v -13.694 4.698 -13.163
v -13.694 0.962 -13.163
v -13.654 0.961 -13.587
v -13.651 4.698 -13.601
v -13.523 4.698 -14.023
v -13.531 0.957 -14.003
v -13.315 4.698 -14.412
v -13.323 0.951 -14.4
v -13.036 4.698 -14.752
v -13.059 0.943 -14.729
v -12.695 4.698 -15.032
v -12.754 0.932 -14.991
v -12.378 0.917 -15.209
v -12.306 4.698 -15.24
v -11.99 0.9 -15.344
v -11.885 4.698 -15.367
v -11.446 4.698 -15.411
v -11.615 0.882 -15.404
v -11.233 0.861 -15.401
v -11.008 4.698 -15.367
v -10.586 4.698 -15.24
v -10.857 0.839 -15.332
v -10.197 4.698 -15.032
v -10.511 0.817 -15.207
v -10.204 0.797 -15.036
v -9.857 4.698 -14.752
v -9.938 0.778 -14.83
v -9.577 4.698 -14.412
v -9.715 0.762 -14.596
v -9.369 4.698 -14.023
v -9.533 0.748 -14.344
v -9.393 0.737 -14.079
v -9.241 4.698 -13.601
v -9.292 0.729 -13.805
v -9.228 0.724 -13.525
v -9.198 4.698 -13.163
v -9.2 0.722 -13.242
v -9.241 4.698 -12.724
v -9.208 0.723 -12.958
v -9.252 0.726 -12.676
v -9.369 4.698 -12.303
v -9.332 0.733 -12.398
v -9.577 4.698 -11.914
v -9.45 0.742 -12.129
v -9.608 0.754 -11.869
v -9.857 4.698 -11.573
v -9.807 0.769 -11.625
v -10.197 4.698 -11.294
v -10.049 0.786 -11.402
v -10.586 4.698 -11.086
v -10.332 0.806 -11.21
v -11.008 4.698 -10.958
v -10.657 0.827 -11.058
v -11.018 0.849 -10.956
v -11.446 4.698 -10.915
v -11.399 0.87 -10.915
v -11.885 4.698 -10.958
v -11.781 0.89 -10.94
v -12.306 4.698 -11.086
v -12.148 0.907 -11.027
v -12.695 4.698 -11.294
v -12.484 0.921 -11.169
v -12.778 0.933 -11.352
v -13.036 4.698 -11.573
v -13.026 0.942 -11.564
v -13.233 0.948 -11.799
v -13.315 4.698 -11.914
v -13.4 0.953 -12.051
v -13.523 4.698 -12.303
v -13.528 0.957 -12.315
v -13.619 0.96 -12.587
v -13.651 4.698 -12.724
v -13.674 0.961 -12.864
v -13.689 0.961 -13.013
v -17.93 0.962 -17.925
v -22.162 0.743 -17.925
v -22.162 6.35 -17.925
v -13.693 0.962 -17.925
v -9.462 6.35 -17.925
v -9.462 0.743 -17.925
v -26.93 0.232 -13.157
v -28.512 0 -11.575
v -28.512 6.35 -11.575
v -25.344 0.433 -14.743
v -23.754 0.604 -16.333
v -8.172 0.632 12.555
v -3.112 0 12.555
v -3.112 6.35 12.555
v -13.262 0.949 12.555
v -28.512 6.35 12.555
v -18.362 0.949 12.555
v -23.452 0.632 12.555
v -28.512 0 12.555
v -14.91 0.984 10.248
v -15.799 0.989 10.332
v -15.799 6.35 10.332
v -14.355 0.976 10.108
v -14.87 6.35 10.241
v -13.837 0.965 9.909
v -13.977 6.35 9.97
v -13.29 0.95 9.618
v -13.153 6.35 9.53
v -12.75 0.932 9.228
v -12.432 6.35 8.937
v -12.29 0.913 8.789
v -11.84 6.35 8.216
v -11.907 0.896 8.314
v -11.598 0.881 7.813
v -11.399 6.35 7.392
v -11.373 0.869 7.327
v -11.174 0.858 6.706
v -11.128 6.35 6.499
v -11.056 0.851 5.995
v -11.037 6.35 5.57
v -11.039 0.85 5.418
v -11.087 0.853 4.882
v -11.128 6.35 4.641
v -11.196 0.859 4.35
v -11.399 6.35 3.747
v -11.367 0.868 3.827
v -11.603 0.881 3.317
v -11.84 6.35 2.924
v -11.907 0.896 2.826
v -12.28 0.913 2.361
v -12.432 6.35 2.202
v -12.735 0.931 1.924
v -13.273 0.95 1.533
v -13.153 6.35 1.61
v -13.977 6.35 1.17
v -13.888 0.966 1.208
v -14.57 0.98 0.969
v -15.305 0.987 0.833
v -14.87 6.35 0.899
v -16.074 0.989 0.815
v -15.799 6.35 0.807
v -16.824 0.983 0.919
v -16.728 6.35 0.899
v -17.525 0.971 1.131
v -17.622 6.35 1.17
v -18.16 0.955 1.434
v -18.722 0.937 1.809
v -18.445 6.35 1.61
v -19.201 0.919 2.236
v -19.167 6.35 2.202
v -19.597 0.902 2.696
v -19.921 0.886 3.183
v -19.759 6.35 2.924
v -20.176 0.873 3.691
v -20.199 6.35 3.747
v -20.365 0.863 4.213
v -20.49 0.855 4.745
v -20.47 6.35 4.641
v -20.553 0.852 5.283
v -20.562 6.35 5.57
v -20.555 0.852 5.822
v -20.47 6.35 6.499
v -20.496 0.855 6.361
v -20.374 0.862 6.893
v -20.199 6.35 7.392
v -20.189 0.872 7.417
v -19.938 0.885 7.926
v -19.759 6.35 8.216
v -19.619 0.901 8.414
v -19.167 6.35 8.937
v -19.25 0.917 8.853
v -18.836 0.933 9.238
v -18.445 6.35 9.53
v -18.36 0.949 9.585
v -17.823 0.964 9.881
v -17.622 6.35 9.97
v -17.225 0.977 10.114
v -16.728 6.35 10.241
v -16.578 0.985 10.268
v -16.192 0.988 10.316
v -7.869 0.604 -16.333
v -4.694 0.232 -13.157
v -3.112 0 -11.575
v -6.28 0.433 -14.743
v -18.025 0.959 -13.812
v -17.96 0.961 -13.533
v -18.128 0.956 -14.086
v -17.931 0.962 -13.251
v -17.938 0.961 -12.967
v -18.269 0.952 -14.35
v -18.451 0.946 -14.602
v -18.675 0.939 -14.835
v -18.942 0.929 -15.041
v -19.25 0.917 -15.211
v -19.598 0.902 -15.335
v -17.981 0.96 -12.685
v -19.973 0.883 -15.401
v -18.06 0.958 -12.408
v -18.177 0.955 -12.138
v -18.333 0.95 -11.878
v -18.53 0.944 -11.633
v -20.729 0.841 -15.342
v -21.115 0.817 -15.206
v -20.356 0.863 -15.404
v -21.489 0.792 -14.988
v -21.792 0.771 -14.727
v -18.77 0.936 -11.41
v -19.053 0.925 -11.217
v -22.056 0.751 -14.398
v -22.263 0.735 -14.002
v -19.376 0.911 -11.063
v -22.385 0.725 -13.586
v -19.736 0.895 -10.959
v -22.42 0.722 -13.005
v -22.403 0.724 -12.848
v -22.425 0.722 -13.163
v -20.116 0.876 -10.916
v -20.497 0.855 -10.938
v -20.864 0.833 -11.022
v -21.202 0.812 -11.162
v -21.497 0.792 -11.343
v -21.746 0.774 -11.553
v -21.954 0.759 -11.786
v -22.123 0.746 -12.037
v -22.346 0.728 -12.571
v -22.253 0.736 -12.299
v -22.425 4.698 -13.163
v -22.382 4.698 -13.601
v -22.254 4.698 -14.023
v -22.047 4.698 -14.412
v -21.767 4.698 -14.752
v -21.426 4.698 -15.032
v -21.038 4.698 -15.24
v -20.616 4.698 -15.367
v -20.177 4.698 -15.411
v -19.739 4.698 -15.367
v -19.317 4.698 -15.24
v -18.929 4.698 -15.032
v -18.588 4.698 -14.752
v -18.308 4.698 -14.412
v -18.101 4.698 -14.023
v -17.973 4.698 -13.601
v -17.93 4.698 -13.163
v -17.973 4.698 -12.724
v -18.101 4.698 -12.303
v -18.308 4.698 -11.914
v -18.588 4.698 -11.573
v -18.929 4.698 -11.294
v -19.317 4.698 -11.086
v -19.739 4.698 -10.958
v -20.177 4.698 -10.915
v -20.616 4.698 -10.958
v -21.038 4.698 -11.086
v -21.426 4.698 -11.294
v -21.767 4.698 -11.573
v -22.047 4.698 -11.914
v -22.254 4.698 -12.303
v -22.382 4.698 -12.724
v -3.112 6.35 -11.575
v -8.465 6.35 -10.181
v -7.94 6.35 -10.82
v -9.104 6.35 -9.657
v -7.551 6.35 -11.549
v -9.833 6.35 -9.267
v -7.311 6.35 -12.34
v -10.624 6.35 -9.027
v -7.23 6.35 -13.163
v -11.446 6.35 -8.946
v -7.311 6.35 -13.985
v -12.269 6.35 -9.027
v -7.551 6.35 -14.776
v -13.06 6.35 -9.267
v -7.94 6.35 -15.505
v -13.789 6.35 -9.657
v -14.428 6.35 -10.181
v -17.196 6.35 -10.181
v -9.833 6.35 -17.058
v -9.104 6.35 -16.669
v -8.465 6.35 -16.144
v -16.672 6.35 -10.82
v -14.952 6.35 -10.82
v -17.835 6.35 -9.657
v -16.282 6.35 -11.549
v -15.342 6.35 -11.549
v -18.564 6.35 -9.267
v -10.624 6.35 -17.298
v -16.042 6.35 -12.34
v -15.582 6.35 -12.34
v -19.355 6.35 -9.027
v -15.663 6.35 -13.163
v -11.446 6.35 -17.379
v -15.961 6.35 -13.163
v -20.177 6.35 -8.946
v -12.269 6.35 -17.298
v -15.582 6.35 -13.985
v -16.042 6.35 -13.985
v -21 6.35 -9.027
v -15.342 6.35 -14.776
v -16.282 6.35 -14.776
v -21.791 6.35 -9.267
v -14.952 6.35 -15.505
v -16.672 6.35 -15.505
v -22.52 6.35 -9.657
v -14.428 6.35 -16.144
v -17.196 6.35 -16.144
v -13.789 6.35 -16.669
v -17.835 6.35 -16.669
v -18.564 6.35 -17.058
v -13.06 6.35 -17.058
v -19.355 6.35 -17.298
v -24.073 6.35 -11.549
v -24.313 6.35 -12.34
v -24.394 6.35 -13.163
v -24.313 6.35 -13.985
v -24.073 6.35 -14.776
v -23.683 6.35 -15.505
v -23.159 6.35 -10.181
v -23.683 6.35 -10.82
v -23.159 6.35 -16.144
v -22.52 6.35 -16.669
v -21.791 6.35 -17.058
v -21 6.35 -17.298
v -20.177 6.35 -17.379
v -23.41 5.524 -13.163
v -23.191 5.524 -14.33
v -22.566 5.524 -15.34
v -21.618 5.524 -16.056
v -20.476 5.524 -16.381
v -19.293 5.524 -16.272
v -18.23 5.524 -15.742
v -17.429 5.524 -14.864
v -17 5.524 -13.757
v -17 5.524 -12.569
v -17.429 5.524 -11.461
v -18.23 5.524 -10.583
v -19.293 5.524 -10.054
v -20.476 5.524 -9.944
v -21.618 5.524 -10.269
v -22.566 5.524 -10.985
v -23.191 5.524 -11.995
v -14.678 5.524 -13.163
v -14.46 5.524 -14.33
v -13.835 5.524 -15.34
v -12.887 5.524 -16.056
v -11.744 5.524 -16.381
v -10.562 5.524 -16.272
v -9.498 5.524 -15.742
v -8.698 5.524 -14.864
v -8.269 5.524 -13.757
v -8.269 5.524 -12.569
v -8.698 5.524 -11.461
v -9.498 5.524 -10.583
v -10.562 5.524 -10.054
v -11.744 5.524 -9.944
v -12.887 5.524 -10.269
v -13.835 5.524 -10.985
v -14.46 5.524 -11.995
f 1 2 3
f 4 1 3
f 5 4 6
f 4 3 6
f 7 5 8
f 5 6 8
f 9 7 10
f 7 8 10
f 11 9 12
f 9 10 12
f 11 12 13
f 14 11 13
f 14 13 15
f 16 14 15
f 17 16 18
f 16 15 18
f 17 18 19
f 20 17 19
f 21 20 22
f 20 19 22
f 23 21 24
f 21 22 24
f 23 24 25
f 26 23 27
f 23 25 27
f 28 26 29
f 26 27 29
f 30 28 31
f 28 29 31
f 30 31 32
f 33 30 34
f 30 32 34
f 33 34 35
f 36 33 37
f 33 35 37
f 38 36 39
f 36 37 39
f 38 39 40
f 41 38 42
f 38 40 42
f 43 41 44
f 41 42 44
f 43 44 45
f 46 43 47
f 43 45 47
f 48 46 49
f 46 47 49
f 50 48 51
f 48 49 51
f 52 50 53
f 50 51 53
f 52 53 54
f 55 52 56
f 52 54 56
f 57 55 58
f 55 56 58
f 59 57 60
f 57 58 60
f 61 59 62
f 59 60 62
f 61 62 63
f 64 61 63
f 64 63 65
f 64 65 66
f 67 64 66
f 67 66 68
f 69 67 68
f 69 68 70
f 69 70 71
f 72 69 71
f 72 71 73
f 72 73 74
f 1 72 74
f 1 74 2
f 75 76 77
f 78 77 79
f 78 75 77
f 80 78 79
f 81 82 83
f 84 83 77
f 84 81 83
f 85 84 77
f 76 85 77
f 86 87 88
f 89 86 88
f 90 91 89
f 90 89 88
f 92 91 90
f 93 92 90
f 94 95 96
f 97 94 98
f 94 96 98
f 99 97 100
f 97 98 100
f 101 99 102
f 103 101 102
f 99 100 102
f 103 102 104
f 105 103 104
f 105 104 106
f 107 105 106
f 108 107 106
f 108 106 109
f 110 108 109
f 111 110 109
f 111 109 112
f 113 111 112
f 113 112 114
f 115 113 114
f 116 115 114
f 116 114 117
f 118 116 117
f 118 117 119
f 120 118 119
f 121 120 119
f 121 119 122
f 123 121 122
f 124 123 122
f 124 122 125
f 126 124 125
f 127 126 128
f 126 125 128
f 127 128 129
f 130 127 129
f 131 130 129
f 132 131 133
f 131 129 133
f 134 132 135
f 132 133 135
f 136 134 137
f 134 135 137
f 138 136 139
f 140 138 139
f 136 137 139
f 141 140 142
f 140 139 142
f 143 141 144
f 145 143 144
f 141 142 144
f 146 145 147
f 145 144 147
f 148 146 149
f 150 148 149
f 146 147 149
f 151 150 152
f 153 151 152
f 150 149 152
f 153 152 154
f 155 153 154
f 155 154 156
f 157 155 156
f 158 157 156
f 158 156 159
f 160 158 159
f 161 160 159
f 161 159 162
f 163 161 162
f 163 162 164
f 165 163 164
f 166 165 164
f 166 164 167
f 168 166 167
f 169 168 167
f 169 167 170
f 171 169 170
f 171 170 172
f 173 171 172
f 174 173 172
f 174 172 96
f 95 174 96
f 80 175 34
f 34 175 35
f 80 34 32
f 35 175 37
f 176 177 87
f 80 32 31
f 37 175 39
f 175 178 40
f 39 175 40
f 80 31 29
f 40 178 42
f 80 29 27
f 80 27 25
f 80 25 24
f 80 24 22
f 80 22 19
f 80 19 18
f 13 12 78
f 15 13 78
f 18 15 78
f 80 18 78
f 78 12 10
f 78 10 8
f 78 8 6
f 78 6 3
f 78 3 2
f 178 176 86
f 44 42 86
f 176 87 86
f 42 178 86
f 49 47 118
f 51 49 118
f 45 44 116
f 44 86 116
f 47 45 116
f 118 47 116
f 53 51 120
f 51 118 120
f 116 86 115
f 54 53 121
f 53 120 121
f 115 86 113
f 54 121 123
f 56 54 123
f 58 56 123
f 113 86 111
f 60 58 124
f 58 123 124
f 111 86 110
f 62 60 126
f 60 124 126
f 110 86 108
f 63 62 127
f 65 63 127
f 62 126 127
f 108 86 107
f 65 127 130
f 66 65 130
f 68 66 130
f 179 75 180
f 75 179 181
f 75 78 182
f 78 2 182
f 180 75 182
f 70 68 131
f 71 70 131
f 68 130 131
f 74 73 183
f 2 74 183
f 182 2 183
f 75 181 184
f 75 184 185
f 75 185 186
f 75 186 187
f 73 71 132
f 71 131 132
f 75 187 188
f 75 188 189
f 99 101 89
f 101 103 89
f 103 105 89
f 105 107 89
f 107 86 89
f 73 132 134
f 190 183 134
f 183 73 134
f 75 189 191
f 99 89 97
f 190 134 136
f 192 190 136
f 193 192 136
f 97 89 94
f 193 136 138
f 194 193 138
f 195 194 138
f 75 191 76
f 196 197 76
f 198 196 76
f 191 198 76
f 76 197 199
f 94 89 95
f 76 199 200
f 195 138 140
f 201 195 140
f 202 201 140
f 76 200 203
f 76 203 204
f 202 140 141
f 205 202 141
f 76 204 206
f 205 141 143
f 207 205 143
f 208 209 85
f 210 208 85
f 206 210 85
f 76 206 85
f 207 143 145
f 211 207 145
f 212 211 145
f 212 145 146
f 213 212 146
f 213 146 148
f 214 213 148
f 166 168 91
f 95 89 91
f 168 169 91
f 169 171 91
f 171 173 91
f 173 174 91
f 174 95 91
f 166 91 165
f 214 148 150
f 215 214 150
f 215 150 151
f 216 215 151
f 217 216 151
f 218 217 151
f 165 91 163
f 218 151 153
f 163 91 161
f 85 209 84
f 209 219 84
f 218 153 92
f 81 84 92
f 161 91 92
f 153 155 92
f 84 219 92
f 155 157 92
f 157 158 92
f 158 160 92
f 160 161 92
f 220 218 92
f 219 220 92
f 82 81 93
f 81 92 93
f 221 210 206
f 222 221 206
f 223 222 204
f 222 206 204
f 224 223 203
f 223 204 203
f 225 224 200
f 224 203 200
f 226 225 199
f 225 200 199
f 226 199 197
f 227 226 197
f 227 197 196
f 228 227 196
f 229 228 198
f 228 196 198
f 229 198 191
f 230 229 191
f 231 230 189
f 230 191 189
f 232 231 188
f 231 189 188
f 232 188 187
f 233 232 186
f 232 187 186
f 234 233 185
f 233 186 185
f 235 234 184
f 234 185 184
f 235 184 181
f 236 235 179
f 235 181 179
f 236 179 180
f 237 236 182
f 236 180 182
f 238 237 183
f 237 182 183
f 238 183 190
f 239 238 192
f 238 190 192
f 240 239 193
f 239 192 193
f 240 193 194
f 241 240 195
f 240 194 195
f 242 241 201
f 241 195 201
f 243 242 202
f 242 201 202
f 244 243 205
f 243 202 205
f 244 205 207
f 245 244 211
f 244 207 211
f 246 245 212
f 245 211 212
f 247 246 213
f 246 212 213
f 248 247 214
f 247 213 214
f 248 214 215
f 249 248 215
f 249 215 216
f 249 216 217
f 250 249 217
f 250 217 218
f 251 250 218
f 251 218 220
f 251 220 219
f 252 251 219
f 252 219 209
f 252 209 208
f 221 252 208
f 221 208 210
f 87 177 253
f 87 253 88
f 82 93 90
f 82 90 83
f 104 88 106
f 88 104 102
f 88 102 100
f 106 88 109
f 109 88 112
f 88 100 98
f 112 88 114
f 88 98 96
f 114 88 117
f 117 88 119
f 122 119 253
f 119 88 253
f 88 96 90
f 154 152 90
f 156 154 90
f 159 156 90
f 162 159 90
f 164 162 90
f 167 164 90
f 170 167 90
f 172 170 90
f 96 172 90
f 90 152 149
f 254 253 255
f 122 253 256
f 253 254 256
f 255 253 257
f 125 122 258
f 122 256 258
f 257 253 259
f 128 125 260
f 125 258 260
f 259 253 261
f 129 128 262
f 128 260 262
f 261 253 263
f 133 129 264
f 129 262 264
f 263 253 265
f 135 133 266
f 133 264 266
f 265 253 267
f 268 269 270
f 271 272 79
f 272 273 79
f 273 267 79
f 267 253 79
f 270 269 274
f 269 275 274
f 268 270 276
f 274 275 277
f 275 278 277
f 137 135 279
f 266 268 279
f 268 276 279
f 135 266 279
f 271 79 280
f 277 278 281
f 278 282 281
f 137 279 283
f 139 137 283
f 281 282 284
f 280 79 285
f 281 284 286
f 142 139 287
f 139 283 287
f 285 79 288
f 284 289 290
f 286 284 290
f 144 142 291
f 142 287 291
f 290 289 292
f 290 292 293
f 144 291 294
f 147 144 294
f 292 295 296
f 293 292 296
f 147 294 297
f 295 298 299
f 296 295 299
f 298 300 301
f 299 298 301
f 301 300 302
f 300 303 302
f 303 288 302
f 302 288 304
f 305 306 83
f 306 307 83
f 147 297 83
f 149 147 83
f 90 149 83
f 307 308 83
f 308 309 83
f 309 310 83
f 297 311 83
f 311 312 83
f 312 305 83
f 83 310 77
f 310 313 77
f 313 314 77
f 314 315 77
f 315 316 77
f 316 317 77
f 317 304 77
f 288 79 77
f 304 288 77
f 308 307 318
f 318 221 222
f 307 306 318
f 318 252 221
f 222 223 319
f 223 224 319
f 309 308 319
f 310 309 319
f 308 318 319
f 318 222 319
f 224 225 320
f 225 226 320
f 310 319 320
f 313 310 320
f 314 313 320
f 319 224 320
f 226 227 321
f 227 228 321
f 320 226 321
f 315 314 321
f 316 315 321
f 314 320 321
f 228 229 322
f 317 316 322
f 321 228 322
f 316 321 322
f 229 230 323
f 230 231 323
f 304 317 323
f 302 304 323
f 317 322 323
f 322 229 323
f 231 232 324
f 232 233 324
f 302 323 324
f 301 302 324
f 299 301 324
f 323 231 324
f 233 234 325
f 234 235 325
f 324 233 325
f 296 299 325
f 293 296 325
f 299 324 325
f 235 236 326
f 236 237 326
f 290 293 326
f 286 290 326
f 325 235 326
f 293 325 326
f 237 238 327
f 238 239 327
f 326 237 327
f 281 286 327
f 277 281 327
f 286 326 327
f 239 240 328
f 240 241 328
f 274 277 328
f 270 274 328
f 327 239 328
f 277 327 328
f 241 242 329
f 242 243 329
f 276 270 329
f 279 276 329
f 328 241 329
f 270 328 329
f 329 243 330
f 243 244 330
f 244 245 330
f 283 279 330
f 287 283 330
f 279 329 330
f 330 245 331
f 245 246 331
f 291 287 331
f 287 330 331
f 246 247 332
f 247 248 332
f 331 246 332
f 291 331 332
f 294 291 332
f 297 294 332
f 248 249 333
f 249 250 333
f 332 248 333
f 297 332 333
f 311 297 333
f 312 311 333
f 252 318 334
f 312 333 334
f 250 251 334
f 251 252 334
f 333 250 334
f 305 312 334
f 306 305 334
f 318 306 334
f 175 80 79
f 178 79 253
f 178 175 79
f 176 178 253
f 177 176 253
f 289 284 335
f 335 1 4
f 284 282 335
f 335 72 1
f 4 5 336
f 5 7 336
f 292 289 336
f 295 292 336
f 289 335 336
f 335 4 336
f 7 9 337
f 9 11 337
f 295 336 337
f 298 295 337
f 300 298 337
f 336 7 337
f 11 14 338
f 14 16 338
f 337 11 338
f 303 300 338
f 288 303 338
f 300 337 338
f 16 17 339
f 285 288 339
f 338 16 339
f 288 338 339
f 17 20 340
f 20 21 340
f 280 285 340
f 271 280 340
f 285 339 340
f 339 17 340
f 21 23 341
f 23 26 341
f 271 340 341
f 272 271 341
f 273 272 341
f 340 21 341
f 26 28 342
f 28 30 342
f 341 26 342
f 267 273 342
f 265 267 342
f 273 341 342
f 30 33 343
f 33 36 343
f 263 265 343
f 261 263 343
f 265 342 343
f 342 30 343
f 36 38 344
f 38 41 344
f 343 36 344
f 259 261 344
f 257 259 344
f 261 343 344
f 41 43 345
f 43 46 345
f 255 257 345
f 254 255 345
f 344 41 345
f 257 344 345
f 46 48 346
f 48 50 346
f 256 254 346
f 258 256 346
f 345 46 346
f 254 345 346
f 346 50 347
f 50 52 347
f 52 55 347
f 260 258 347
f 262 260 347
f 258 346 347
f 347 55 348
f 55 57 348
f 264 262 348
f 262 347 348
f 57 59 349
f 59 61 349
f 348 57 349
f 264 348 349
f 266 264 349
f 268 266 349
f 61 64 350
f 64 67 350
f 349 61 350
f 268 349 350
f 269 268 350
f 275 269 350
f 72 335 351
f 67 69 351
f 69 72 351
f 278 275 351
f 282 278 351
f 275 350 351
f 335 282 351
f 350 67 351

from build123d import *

# Parameters (mm, degrees)
BOSS_EXTRUDE1_DEPTH                               = 6.35
CSK_FOR_8_FLAT_HEAD_MACHINE_SCREW_100_D           = 4.4958
CSK_FOR_8_FLAT_HEAD_MACHINE_SCREW_100_CSINK_D     = 8.4328
CSK_FOR_8_FLAT_HEAD_MACHINE_SCREW_100_CSINK_ANGLE = 100
SKETCH2_R                                         = 82.042
CUT_EXTRUDE1_DEPTH                                = 43.217023873
SKETCH5_R                                         = 1.1303
CUT_EXTRUDE2_DEPTH                                = 35.271884391
SKETCH6_R                                         = 4.7625
CUT_EXTRUDE3_DEPTH                                = 35.271884391


with BuildPart() as part:
    # Sketch1 → Boss-Extrude1 (new body)
    with BuildSketch(Plane(origin=(0, 0, 0), x_dir=(1, 0, 0), z_dir=(0, 1, 0))):
        Polygon((-28.511825699, 11.575271113), (-22.161825699, 17.925271113), (-9.461825699, 17.925271113), (-3.111825699, 11.575271113), (-3.111825699, -12.554728887), (-28.511825699, -12.554728887), align=None)
    extrude(amount=BOSS_EXTRUDE1_DEPTH)

    # CSK for #8 Flat Head Machine Screw (100)1 (through all)
    with Locations(Plane(origin=(0, 6.35, 0), x_dir=(1, 0, 0), z_dir=(0, 1, 0))):
        with Locations((-20.177450699, 13.162771113), (-11.446200699, 13.162771113)):
            CounterSinkHole(CSK_FOR_8_FLAT_HEAD_MACHINE_SCREW_100_D / 2, CSK_FOR_8_FLAT_HEAD_MACHINE_SCREW_100_CSINK_D / 2, counter_sink_angle=CSK_FOR_8_FLAT_HEAD_MACHINE_SCREW_100_CSINK_ANGLE)

    # Sketch2 → Cut-Extrude1 (cut, through all)
    with BuildSketch(Plane.XY.offset(12.554728887)):
        with Locations((-15.811825699, -81.053067579)):
            Circle(SKETCH2_R)
    extrude(amount=-CUT_EXTRUDE1_DEPTH, mode=Mode.SUBTRACT)

    # Sketch5 → Cut-Extrude2 (cut, through all)
    with BuildSketch(Plane(origin=(0, 6.35, 0), x_dir=(1, 0, 0), z_dir=(0, 1, 0))):
        with Locations(Location((-15.799380503, -5.569728887, 0), (0, 0, 270))):
            Circle(SKETCH5_R)
    extrude(amount=-CUT_EXTRUDE2_DEPTH, mode=Mode.SUBTRACT)

    # Sketch6 → Cut-Extrude3 (cut, through all)
    with BuildSketch(Plane(origin=(0, 6.35, 0), x_dir=(1, 0, 0), z_dir=(0, 1, 0))):
        with Locations(Location((-15.799380503, -5.569728887, 0), (0, 0, 270))):
            Circle(SKETCH6_R)
    extrude(amount=-CUT_EXTRUDE3_DEPTH, mode=Mode.SUBTRACT)


solid = part.part
